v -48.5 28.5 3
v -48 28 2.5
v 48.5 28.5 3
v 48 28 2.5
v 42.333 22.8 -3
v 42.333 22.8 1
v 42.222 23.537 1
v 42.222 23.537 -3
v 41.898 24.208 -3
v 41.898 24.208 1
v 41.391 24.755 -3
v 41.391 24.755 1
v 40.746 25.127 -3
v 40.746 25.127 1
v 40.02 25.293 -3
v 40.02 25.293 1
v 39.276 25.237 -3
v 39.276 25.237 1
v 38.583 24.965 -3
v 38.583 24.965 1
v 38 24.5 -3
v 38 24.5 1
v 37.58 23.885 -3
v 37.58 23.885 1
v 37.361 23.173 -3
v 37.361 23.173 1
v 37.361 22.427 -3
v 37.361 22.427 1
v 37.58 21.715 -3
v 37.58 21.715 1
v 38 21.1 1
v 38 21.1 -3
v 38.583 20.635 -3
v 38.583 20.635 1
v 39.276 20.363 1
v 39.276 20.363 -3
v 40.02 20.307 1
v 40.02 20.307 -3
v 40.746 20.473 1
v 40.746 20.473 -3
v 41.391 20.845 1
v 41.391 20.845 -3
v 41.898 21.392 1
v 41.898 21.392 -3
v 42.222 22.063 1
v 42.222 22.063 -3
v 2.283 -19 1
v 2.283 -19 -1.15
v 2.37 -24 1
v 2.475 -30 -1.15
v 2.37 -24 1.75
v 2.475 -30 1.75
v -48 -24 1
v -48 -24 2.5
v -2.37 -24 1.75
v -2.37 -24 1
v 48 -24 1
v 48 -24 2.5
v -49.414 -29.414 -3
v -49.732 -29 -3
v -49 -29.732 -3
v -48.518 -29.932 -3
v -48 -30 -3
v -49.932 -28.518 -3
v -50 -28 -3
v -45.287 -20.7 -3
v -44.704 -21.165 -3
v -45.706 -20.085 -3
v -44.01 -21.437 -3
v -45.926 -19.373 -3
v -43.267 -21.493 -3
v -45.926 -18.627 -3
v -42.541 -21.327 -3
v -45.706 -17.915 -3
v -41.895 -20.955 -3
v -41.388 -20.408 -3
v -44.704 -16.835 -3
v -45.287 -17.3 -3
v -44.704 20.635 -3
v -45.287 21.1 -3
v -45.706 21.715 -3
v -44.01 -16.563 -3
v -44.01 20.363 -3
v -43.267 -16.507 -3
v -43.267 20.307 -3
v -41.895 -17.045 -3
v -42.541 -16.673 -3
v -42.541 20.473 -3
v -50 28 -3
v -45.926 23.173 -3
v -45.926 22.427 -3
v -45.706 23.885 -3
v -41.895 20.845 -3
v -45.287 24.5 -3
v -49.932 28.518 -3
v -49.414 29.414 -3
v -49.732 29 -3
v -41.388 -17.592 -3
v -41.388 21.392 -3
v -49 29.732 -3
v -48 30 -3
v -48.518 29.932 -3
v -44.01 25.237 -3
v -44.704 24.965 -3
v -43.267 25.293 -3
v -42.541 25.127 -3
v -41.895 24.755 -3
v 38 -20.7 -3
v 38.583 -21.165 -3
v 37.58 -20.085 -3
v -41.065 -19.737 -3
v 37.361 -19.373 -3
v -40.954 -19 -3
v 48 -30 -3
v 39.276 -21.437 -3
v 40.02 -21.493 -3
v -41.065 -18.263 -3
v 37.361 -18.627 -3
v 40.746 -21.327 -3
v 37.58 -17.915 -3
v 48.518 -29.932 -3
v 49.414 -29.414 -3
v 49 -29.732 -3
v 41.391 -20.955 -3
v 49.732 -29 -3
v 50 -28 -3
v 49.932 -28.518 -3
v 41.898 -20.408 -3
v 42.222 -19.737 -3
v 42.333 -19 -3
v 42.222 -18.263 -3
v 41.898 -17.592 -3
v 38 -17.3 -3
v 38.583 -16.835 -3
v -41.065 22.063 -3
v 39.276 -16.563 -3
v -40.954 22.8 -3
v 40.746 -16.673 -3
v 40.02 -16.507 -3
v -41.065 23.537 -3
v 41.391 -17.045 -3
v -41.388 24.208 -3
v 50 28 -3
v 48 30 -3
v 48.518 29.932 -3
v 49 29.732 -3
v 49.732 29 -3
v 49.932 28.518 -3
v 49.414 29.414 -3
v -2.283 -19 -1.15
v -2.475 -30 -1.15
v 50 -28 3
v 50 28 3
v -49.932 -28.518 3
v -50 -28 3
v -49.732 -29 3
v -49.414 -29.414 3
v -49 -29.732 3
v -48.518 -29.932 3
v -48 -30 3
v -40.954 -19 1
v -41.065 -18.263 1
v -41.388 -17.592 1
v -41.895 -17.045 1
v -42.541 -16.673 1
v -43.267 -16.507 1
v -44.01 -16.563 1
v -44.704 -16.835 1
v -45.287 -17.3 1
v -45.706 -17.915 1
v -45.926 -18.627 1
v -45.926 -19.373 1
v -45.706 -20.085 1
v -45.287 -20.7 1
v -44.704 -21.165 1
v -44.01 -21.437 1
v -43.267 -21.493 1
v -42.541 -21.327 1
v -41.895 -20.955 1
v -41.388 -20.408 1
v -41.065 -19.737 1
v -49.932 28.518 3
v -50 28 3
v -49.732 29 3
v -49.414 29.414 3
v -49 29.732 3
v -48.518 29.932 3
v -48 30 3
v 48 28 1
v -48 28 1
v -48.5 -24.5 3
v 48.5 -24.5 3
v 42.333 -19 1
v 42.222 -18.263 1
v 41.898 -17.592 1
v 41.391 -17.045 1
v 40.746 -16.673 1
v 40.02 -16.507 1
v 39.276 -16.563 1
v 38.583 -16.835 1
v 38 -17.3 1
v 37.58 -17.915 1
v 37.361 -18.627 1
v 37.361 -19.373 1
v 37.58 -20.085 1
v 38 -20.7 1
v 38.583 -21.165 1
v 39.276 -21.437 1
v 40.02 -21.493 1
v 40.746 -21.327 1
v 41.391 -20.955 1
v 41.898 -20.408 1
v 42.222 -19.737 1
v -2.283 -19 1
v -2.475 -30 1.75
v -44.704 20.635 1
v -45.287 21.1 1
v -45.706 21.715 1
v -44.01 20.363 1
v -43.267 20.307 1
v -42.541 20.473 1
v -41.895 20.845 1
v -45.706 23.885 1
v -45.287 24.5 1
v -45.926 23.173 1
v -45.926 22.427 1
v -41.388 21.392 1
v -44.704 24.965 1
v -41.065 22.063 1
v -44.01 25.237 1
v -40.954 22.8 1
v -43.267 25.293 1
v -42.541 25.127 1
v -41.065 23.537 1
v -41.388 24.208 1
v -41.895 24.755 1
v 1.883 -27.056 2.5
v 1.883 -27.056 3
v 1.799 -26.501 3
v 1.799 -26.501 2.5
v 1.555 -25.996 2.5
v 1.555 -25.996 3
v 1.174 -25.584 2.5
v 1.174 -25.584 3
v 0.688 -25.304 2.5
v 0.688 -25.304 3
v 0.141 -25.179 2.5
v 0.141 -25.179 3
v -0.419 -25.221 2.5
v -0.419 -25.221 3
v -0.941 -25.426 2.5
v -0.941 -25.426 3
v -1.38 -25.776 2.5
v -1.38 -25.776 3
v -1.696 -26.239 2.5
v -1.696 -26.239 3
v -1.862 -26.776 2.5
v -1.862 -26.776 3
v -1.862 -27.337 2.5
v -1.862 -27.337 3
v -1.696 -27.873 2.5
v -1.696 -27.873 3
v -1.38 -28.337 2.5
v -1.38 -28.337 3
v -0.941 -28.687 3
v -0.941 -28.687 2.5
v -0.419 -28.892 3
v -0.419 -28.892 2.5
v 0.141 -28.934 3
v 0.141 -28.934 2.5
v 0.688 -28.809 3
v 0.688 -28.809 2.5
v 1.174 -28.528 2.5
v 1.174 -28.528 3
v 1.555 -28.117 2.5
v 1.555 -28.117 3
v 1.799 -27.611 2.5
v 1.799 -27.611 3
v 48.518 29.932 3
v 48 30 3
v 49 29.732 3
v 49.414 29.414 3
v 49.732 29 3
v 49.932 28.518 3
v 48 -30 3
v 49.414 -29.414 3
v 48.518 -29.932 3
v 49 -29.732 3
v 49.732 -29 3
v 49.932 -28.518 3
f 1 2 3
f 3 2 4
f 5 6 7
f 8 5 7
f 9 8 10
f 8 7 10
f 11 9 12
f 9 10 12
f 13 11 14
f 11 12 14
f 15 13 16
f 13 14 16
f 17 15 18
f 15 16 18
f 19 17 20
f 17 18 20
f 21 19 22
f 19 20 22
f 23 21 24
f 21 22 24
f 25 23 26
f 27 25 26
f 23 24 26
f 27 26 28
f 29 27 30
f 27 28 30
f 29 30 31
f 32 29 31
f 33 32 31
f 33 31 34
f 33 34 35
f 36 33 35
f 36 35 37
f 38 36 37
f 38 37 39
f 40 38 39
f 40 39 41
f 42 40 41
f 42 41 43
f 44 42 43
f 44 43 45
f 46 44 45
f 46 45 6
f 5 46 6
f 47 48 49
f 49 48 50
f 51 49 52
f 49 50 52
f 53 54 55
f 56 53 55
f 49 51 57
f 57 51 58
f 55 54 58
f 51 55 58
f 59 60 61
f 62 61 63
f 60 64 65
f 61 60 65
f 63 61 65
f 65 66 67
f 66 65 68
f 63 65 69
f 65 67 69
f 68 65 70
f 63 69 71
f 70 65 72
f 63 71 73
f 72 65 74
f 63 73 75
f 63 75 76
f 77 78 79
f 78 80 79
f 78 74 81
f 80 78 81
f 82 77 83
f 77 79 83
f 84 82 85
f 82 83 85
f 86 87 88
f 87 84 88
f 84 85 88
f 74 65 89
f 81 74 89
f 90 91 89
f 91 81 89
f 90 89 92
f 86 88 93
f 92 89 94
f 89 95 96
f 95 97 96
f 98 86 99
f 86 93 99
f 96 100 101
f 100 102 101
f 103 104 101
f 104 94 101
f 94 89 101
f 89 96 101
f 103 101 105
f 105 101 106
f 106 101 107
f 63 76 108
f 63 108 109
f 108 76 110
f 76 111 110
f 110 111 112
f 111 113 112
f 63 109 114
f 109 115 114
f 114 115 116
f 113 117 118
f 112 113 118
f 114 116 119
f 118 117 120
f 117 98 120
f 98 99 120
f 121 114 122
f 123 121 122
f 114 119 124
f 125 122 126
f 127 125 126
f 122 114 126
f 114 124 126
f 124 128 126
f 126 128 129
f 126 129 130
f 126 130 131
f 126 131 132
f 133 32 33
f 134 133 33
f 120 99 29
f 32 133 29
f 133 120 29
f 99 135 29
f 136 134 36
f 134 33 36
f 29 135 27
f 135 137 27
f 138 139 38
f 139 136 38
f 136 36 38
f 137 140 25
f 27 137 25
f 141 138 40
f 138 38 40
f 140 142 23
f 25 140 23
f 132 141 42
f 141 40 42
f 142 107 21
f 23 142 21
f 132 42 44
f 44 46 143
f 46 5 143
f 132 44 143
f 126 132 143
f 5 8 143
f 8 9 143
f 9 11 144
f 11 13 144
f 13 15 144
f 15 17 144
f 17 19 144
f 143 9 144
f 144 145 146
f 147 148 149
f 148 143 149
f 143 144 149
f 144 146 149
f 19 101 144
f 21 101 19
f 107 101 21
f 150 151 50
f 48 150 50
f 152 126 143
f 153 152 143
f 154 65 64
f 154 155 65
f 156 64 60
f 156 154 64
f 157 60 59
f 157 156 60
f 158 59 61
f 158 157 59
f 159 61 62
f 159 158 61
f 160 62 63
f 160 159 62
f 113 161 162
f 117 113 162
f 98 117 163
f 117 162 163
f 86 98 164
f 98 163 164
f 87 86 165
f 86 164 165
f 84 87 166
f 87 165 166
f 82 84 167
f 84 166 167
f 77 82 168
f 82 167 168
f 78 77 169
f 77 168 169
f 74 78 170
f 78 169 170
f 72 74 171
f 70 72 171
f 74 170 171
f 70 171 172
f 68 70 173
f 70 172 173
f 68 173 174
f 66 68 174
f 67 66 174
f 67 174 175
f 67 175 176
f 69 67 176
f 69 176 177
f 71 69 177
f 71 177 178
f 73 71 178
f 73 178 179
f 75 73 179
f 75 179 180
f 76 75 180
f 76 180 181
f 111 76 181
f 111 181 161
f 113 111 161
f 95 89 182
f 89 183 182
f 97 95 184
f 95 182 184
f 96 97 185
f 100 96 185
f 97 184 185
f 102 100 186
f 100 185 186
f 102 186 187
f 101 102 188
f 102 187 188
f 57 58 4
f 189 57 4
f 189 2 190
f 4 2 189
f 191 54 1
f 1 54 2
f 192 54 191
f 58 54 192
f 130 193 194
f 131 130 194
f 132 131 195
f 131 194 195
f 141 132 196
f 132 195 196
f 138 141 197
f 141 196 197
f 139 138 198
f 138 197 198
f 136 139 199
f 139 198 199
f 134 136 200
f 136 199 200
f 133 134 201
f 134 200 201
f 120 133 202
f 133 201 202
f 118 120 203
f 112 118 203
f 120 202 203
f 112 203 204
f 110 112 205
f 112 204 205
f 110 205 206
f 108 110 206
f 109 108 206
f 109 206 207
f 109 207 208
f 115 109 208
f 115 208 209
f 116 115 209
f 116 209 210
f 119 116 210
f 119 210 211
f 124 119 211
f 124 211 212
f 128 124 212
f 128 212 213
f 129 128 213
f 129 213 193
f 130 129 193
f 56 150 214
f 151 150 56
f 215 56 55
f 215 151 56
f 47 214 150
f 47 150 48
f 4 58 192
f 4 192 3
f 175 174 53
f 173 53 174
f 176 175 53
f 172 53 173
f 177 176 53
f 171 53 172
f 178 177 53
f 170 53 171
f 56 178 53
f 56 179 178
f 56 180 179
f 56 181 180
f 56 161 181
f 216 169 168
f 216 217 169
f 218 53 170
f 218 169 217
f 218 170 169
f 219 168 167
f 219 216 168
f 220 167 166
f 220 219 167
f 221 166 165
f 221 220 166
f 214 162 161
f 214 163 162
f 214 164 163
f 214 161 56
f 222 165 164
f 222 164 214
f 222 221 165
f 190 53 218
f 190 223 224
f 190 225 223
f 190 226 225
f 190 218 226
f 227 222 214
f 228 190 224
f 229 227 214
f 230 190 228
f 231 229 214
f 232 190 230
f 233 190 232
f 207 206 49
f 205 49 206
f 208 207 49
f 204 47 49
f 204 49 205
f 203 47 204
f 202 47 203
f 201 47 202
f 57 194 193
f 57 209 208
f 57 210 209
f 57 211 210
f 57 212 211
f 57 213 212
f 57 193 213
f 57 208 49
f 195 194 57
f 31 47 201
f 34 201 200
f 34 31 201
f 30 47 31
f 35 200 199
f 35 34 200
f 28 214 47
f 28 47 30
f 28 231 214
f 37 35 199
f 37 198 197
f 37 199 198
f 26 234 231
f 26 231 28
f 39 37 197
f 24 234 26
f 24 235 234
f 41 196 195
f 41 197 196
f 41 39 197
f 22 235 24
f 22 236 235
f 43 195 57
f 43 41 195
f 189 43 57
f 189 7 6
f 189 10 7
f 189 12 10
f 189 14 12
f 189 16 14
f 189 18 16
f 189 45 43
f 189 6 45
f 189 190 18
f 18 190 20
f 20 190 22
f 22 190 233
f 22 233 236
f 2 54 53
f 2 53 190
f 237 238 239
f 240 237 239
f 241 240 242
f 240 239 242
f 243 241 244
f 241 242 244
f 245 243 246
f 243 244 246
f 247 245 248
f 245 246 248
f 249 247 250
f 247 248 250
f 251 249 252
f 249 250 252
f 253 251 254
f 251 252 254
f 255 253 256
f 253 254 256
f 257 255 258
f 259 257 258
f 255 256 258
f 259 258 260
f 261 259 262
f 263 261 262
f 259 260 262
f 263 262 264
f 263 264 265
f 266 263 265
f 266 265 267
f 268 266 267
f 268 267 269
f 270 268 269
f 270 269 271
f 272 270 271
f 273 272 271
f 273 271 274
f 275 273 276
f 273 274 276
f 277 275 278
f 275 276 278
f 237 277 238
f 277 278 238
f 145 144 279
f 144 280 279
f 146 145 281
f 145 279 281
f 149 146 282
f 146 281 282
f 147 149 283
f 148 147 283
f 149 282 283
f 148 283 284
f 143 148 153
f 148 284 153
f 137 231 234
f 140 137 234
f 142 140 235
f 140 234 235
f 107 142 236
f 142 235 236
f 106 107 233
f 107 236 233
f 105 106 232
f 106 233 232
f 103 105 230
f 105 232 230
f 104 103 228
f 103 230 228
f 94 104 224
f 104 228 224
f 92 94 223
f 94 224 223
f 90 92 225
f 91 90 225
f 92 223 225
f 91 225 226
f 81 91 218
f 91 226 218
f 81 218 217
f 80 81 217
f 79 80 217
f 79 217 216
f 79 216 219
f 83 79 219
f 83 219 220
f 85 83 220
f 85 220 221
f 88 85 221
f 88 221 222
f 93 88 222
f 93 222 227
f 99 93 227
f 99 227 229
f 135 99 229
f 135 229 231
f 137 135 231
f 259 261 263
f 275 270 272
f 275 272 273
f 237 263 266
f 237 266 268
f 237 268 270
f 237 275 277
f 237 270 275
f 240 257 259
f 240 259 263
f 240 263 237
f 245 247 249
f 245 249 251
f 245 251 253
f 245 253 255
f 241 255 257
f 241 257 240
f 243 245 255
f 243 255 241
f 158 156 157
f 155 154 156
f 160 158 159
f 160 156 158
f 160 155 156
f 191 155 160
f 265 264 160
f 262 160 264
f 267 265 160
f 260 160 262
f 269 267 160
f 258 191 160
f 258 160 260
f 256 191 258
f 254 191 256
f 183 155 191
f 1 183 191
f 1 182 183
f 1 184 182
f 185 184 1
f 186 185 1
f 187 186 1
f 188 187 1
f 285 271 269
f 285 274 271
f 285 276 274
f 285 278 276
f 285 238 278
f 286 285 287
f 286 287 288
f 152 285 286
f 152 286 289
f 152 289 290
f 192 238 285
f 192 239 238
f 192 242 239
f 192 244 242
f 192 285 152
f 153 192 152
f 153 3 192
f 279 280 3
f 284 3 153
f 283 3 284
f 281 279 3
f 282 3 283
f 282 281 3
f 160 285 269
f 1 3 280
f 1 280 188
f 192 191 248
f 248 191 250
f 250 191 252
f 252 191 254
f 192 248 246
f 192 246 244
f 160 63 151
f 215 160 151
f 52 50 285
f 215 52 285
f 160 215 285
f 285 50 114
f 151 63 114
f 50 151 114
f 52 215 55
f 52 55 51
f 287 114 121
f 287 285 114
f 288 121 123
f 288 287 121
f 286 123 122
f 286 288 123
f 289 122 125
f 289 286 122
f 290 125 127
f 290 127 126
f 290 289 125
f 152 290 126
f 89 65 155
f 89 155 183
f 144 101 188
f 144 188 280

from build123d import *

# Parameters (mm, degrees)
BOSS_EXTRUDE1_DEPTH      = 3
BOSS_EXTRUDE1_DEPTH_BACK = 3
SKETCH1_W                = 100
SKETCH1_H                = 60
SKETCH2_W                = 4.95
SKETCH2_H                = 2.9
CUT_EXTRUDE1_DEPTH       = 11
DRAFT1_ANGLE             = 1
SKETCH3_W                = 96
SKETCH3_H                = 52
CUT_EXTRUDE2_DEPTH       = 2
FILLET1_R                = 2
SKETCH4_R                = 2.5
CUT_EXTRUDE3_DEPTH       = 59.446556785
CHAMFER1_SIZE            = 0.5
SKETCH5_R                = 1.882569545
CUT_EXTRUDE4_DEPTH       = 0.5


with BuildPart() as part:
    # Sketch1 → Boss-Extrude1 (new, two sides: drawn at the far end of the back side and taken through both)
    with BuildSketch(Plane.XY.offset(-BOSS_EXTRUDE1_DEPTH_BACK)):
        Rectangle(SKETCH1_W, SKETCH1_H)
    extrude(amount=BOSS_EXTRUDE1_DEPTH + BOSS_EXTRUDE1_DEPTH_BACK)

    # Sketch2 → Cut-Extrude1 (cut)
    with BuildSketch(Plane.XZ.offset(30)):
        with Locations((0, 0.3)):
            Rectangle(SKETCH2_W, SKETCH2_H)
    extrude(amount=-CUT_EXTRUDE1_DEPTH, mode=Mode.SUBTRACT)

    # Draft1
    draft1_faces = [part.faces().sort_by_distance(p)[0] for p in [
        (-2.475, -24.5, 0.3),
        (2.475, -24.5, 0.3),
    ]]
    draft(draft1_faces, Plane(origin=(-50, -30, -3), x_dir=(-1, 0, 0), z_dir=(0, -1, 0)), DRAFT1_ANGLE)

    # Sketch3 → Cut-Extrude2 (cut)
    with BuildSketch(Plane.XY.offset(3)):
        with Locations((0, 2)):
            Rectangle(SKETCH3_W, SKETCH3_H)
    extrude(amount=-CUT_EXTRUDE2_DEPTH, mode=Mode.SUBTRACT)

    # Fillet1
    fillet1_edges = [part.edges().sort_by_distance(p)[0] for p in [
        (-50, 30, 0),
        (50, 30, 0),
        (50, -30, 0),
        (-50, -30, 0),
    ]]
    fillet(fillet1_edges, radius=FILLET1_R)

    # Sketch4 → Cut-Extrude3 (cut, through all)
    with BuildSketch(Plane.XY.offset(1)):
        with Locations((-43.453932042, 22.8)):
            Circle(SKETCH4_R)
        with Locations((-43.453932042, -19)):
            Circle(SKETCH4_R)
        with Locations((39.832771039, -19)):
            Circle(SKETCH4_R)
        with Locations((39.832771039, 22.8)):
            Circle(SKETCH4_R)
    extrude(amount=-CUT_EXTRUDE3_DEPTH, mode=Mode.SUBTRACT)

    # Chamfer1
    chamfer1_edges = [part.edges().sort_by_distance(p)[0] for p in [
        (-48, 2, 3),
        (0, -24, 3),
        (48, 2, 3),
        (0, 28, 3),
    ]]
    chamfer(chamfer1_edges, length=CHAMFER1_SIZE)

    # Sketch5 → Cut-Extrude4 (cut)
    with BuildSketch(Plane.XY.offset(3)):
        with Locations((0, -27.056295937)):
            Circle(SKETCH5_R)
    extrude(amount=-CUT_EXTRUDE4_DEPTH, mode=Mode.SUBTRACT)


solid = part.part
